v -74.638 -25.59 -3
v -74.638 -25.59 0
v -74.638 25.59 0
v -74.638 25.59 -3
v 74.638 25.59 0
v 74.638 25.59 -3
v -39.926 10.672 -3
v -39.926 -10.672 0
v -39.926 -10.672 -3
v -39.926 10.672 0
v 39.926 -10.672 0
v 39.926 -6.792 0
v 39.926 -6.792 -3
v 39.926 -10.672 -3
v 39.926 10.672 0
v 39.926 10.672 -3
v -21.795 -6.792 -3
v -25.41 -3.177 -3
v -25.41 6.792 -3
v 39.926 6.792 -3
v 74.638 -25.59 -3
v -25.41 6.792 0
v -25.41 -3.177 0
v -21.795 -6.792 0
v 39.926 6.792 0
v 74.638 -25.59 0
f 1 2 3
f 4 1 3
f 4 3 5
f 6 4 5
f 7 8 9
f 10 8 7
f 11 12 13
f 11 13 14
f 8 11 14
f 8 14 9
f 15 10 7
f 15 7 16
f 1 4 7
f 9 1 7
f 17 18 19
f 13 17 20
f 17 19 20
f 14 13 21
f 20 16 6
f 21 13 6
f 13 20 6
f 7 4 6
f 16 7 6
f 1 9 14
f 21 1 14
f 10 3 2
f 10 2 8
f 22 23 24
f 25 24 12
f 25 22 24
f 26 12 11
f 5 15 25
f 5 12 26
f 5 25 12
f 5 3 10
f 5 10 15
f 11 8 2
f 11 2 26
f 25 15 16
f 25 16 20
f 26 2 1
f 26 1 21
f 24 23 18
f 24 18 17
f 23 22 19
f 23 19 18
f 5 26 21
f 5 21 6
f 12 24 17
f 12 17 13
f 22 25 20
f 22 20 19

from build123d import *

# Parameters (mm, degrees)
F_1_FR_W               = 149.275698602
F_1_FR_H               = 51.18023952
SM_BASE_FLANGE_1_DEPTH = 3


# Sheet-metal steps are written as plain solids
with BuildPart() as part:
    # Эскиз1_fr → Базовая кромка1 (new body)
    with BuildSketch(Plane.XY):
        Rectangle(F_1_FR_W, F_1_FR_H)
        Polygon((39.926451229, -10.672105555), (-39.926451229, -10.672105555), (-39.926451229, 10.672105555), (39.926451229, 10.672105555), (39.926451229, 6.791965083), (-25.410080628, 6.791965083), (-25.410080628, -3.177311756), (-21.795427302, -6.791965083), (39.926451229, -6.791965083), align=None, mode=Mode.SUBTRACT)
    extrude(amount=-SM_BASE_FLANGE_1_DEPTH)


solid = part.part
